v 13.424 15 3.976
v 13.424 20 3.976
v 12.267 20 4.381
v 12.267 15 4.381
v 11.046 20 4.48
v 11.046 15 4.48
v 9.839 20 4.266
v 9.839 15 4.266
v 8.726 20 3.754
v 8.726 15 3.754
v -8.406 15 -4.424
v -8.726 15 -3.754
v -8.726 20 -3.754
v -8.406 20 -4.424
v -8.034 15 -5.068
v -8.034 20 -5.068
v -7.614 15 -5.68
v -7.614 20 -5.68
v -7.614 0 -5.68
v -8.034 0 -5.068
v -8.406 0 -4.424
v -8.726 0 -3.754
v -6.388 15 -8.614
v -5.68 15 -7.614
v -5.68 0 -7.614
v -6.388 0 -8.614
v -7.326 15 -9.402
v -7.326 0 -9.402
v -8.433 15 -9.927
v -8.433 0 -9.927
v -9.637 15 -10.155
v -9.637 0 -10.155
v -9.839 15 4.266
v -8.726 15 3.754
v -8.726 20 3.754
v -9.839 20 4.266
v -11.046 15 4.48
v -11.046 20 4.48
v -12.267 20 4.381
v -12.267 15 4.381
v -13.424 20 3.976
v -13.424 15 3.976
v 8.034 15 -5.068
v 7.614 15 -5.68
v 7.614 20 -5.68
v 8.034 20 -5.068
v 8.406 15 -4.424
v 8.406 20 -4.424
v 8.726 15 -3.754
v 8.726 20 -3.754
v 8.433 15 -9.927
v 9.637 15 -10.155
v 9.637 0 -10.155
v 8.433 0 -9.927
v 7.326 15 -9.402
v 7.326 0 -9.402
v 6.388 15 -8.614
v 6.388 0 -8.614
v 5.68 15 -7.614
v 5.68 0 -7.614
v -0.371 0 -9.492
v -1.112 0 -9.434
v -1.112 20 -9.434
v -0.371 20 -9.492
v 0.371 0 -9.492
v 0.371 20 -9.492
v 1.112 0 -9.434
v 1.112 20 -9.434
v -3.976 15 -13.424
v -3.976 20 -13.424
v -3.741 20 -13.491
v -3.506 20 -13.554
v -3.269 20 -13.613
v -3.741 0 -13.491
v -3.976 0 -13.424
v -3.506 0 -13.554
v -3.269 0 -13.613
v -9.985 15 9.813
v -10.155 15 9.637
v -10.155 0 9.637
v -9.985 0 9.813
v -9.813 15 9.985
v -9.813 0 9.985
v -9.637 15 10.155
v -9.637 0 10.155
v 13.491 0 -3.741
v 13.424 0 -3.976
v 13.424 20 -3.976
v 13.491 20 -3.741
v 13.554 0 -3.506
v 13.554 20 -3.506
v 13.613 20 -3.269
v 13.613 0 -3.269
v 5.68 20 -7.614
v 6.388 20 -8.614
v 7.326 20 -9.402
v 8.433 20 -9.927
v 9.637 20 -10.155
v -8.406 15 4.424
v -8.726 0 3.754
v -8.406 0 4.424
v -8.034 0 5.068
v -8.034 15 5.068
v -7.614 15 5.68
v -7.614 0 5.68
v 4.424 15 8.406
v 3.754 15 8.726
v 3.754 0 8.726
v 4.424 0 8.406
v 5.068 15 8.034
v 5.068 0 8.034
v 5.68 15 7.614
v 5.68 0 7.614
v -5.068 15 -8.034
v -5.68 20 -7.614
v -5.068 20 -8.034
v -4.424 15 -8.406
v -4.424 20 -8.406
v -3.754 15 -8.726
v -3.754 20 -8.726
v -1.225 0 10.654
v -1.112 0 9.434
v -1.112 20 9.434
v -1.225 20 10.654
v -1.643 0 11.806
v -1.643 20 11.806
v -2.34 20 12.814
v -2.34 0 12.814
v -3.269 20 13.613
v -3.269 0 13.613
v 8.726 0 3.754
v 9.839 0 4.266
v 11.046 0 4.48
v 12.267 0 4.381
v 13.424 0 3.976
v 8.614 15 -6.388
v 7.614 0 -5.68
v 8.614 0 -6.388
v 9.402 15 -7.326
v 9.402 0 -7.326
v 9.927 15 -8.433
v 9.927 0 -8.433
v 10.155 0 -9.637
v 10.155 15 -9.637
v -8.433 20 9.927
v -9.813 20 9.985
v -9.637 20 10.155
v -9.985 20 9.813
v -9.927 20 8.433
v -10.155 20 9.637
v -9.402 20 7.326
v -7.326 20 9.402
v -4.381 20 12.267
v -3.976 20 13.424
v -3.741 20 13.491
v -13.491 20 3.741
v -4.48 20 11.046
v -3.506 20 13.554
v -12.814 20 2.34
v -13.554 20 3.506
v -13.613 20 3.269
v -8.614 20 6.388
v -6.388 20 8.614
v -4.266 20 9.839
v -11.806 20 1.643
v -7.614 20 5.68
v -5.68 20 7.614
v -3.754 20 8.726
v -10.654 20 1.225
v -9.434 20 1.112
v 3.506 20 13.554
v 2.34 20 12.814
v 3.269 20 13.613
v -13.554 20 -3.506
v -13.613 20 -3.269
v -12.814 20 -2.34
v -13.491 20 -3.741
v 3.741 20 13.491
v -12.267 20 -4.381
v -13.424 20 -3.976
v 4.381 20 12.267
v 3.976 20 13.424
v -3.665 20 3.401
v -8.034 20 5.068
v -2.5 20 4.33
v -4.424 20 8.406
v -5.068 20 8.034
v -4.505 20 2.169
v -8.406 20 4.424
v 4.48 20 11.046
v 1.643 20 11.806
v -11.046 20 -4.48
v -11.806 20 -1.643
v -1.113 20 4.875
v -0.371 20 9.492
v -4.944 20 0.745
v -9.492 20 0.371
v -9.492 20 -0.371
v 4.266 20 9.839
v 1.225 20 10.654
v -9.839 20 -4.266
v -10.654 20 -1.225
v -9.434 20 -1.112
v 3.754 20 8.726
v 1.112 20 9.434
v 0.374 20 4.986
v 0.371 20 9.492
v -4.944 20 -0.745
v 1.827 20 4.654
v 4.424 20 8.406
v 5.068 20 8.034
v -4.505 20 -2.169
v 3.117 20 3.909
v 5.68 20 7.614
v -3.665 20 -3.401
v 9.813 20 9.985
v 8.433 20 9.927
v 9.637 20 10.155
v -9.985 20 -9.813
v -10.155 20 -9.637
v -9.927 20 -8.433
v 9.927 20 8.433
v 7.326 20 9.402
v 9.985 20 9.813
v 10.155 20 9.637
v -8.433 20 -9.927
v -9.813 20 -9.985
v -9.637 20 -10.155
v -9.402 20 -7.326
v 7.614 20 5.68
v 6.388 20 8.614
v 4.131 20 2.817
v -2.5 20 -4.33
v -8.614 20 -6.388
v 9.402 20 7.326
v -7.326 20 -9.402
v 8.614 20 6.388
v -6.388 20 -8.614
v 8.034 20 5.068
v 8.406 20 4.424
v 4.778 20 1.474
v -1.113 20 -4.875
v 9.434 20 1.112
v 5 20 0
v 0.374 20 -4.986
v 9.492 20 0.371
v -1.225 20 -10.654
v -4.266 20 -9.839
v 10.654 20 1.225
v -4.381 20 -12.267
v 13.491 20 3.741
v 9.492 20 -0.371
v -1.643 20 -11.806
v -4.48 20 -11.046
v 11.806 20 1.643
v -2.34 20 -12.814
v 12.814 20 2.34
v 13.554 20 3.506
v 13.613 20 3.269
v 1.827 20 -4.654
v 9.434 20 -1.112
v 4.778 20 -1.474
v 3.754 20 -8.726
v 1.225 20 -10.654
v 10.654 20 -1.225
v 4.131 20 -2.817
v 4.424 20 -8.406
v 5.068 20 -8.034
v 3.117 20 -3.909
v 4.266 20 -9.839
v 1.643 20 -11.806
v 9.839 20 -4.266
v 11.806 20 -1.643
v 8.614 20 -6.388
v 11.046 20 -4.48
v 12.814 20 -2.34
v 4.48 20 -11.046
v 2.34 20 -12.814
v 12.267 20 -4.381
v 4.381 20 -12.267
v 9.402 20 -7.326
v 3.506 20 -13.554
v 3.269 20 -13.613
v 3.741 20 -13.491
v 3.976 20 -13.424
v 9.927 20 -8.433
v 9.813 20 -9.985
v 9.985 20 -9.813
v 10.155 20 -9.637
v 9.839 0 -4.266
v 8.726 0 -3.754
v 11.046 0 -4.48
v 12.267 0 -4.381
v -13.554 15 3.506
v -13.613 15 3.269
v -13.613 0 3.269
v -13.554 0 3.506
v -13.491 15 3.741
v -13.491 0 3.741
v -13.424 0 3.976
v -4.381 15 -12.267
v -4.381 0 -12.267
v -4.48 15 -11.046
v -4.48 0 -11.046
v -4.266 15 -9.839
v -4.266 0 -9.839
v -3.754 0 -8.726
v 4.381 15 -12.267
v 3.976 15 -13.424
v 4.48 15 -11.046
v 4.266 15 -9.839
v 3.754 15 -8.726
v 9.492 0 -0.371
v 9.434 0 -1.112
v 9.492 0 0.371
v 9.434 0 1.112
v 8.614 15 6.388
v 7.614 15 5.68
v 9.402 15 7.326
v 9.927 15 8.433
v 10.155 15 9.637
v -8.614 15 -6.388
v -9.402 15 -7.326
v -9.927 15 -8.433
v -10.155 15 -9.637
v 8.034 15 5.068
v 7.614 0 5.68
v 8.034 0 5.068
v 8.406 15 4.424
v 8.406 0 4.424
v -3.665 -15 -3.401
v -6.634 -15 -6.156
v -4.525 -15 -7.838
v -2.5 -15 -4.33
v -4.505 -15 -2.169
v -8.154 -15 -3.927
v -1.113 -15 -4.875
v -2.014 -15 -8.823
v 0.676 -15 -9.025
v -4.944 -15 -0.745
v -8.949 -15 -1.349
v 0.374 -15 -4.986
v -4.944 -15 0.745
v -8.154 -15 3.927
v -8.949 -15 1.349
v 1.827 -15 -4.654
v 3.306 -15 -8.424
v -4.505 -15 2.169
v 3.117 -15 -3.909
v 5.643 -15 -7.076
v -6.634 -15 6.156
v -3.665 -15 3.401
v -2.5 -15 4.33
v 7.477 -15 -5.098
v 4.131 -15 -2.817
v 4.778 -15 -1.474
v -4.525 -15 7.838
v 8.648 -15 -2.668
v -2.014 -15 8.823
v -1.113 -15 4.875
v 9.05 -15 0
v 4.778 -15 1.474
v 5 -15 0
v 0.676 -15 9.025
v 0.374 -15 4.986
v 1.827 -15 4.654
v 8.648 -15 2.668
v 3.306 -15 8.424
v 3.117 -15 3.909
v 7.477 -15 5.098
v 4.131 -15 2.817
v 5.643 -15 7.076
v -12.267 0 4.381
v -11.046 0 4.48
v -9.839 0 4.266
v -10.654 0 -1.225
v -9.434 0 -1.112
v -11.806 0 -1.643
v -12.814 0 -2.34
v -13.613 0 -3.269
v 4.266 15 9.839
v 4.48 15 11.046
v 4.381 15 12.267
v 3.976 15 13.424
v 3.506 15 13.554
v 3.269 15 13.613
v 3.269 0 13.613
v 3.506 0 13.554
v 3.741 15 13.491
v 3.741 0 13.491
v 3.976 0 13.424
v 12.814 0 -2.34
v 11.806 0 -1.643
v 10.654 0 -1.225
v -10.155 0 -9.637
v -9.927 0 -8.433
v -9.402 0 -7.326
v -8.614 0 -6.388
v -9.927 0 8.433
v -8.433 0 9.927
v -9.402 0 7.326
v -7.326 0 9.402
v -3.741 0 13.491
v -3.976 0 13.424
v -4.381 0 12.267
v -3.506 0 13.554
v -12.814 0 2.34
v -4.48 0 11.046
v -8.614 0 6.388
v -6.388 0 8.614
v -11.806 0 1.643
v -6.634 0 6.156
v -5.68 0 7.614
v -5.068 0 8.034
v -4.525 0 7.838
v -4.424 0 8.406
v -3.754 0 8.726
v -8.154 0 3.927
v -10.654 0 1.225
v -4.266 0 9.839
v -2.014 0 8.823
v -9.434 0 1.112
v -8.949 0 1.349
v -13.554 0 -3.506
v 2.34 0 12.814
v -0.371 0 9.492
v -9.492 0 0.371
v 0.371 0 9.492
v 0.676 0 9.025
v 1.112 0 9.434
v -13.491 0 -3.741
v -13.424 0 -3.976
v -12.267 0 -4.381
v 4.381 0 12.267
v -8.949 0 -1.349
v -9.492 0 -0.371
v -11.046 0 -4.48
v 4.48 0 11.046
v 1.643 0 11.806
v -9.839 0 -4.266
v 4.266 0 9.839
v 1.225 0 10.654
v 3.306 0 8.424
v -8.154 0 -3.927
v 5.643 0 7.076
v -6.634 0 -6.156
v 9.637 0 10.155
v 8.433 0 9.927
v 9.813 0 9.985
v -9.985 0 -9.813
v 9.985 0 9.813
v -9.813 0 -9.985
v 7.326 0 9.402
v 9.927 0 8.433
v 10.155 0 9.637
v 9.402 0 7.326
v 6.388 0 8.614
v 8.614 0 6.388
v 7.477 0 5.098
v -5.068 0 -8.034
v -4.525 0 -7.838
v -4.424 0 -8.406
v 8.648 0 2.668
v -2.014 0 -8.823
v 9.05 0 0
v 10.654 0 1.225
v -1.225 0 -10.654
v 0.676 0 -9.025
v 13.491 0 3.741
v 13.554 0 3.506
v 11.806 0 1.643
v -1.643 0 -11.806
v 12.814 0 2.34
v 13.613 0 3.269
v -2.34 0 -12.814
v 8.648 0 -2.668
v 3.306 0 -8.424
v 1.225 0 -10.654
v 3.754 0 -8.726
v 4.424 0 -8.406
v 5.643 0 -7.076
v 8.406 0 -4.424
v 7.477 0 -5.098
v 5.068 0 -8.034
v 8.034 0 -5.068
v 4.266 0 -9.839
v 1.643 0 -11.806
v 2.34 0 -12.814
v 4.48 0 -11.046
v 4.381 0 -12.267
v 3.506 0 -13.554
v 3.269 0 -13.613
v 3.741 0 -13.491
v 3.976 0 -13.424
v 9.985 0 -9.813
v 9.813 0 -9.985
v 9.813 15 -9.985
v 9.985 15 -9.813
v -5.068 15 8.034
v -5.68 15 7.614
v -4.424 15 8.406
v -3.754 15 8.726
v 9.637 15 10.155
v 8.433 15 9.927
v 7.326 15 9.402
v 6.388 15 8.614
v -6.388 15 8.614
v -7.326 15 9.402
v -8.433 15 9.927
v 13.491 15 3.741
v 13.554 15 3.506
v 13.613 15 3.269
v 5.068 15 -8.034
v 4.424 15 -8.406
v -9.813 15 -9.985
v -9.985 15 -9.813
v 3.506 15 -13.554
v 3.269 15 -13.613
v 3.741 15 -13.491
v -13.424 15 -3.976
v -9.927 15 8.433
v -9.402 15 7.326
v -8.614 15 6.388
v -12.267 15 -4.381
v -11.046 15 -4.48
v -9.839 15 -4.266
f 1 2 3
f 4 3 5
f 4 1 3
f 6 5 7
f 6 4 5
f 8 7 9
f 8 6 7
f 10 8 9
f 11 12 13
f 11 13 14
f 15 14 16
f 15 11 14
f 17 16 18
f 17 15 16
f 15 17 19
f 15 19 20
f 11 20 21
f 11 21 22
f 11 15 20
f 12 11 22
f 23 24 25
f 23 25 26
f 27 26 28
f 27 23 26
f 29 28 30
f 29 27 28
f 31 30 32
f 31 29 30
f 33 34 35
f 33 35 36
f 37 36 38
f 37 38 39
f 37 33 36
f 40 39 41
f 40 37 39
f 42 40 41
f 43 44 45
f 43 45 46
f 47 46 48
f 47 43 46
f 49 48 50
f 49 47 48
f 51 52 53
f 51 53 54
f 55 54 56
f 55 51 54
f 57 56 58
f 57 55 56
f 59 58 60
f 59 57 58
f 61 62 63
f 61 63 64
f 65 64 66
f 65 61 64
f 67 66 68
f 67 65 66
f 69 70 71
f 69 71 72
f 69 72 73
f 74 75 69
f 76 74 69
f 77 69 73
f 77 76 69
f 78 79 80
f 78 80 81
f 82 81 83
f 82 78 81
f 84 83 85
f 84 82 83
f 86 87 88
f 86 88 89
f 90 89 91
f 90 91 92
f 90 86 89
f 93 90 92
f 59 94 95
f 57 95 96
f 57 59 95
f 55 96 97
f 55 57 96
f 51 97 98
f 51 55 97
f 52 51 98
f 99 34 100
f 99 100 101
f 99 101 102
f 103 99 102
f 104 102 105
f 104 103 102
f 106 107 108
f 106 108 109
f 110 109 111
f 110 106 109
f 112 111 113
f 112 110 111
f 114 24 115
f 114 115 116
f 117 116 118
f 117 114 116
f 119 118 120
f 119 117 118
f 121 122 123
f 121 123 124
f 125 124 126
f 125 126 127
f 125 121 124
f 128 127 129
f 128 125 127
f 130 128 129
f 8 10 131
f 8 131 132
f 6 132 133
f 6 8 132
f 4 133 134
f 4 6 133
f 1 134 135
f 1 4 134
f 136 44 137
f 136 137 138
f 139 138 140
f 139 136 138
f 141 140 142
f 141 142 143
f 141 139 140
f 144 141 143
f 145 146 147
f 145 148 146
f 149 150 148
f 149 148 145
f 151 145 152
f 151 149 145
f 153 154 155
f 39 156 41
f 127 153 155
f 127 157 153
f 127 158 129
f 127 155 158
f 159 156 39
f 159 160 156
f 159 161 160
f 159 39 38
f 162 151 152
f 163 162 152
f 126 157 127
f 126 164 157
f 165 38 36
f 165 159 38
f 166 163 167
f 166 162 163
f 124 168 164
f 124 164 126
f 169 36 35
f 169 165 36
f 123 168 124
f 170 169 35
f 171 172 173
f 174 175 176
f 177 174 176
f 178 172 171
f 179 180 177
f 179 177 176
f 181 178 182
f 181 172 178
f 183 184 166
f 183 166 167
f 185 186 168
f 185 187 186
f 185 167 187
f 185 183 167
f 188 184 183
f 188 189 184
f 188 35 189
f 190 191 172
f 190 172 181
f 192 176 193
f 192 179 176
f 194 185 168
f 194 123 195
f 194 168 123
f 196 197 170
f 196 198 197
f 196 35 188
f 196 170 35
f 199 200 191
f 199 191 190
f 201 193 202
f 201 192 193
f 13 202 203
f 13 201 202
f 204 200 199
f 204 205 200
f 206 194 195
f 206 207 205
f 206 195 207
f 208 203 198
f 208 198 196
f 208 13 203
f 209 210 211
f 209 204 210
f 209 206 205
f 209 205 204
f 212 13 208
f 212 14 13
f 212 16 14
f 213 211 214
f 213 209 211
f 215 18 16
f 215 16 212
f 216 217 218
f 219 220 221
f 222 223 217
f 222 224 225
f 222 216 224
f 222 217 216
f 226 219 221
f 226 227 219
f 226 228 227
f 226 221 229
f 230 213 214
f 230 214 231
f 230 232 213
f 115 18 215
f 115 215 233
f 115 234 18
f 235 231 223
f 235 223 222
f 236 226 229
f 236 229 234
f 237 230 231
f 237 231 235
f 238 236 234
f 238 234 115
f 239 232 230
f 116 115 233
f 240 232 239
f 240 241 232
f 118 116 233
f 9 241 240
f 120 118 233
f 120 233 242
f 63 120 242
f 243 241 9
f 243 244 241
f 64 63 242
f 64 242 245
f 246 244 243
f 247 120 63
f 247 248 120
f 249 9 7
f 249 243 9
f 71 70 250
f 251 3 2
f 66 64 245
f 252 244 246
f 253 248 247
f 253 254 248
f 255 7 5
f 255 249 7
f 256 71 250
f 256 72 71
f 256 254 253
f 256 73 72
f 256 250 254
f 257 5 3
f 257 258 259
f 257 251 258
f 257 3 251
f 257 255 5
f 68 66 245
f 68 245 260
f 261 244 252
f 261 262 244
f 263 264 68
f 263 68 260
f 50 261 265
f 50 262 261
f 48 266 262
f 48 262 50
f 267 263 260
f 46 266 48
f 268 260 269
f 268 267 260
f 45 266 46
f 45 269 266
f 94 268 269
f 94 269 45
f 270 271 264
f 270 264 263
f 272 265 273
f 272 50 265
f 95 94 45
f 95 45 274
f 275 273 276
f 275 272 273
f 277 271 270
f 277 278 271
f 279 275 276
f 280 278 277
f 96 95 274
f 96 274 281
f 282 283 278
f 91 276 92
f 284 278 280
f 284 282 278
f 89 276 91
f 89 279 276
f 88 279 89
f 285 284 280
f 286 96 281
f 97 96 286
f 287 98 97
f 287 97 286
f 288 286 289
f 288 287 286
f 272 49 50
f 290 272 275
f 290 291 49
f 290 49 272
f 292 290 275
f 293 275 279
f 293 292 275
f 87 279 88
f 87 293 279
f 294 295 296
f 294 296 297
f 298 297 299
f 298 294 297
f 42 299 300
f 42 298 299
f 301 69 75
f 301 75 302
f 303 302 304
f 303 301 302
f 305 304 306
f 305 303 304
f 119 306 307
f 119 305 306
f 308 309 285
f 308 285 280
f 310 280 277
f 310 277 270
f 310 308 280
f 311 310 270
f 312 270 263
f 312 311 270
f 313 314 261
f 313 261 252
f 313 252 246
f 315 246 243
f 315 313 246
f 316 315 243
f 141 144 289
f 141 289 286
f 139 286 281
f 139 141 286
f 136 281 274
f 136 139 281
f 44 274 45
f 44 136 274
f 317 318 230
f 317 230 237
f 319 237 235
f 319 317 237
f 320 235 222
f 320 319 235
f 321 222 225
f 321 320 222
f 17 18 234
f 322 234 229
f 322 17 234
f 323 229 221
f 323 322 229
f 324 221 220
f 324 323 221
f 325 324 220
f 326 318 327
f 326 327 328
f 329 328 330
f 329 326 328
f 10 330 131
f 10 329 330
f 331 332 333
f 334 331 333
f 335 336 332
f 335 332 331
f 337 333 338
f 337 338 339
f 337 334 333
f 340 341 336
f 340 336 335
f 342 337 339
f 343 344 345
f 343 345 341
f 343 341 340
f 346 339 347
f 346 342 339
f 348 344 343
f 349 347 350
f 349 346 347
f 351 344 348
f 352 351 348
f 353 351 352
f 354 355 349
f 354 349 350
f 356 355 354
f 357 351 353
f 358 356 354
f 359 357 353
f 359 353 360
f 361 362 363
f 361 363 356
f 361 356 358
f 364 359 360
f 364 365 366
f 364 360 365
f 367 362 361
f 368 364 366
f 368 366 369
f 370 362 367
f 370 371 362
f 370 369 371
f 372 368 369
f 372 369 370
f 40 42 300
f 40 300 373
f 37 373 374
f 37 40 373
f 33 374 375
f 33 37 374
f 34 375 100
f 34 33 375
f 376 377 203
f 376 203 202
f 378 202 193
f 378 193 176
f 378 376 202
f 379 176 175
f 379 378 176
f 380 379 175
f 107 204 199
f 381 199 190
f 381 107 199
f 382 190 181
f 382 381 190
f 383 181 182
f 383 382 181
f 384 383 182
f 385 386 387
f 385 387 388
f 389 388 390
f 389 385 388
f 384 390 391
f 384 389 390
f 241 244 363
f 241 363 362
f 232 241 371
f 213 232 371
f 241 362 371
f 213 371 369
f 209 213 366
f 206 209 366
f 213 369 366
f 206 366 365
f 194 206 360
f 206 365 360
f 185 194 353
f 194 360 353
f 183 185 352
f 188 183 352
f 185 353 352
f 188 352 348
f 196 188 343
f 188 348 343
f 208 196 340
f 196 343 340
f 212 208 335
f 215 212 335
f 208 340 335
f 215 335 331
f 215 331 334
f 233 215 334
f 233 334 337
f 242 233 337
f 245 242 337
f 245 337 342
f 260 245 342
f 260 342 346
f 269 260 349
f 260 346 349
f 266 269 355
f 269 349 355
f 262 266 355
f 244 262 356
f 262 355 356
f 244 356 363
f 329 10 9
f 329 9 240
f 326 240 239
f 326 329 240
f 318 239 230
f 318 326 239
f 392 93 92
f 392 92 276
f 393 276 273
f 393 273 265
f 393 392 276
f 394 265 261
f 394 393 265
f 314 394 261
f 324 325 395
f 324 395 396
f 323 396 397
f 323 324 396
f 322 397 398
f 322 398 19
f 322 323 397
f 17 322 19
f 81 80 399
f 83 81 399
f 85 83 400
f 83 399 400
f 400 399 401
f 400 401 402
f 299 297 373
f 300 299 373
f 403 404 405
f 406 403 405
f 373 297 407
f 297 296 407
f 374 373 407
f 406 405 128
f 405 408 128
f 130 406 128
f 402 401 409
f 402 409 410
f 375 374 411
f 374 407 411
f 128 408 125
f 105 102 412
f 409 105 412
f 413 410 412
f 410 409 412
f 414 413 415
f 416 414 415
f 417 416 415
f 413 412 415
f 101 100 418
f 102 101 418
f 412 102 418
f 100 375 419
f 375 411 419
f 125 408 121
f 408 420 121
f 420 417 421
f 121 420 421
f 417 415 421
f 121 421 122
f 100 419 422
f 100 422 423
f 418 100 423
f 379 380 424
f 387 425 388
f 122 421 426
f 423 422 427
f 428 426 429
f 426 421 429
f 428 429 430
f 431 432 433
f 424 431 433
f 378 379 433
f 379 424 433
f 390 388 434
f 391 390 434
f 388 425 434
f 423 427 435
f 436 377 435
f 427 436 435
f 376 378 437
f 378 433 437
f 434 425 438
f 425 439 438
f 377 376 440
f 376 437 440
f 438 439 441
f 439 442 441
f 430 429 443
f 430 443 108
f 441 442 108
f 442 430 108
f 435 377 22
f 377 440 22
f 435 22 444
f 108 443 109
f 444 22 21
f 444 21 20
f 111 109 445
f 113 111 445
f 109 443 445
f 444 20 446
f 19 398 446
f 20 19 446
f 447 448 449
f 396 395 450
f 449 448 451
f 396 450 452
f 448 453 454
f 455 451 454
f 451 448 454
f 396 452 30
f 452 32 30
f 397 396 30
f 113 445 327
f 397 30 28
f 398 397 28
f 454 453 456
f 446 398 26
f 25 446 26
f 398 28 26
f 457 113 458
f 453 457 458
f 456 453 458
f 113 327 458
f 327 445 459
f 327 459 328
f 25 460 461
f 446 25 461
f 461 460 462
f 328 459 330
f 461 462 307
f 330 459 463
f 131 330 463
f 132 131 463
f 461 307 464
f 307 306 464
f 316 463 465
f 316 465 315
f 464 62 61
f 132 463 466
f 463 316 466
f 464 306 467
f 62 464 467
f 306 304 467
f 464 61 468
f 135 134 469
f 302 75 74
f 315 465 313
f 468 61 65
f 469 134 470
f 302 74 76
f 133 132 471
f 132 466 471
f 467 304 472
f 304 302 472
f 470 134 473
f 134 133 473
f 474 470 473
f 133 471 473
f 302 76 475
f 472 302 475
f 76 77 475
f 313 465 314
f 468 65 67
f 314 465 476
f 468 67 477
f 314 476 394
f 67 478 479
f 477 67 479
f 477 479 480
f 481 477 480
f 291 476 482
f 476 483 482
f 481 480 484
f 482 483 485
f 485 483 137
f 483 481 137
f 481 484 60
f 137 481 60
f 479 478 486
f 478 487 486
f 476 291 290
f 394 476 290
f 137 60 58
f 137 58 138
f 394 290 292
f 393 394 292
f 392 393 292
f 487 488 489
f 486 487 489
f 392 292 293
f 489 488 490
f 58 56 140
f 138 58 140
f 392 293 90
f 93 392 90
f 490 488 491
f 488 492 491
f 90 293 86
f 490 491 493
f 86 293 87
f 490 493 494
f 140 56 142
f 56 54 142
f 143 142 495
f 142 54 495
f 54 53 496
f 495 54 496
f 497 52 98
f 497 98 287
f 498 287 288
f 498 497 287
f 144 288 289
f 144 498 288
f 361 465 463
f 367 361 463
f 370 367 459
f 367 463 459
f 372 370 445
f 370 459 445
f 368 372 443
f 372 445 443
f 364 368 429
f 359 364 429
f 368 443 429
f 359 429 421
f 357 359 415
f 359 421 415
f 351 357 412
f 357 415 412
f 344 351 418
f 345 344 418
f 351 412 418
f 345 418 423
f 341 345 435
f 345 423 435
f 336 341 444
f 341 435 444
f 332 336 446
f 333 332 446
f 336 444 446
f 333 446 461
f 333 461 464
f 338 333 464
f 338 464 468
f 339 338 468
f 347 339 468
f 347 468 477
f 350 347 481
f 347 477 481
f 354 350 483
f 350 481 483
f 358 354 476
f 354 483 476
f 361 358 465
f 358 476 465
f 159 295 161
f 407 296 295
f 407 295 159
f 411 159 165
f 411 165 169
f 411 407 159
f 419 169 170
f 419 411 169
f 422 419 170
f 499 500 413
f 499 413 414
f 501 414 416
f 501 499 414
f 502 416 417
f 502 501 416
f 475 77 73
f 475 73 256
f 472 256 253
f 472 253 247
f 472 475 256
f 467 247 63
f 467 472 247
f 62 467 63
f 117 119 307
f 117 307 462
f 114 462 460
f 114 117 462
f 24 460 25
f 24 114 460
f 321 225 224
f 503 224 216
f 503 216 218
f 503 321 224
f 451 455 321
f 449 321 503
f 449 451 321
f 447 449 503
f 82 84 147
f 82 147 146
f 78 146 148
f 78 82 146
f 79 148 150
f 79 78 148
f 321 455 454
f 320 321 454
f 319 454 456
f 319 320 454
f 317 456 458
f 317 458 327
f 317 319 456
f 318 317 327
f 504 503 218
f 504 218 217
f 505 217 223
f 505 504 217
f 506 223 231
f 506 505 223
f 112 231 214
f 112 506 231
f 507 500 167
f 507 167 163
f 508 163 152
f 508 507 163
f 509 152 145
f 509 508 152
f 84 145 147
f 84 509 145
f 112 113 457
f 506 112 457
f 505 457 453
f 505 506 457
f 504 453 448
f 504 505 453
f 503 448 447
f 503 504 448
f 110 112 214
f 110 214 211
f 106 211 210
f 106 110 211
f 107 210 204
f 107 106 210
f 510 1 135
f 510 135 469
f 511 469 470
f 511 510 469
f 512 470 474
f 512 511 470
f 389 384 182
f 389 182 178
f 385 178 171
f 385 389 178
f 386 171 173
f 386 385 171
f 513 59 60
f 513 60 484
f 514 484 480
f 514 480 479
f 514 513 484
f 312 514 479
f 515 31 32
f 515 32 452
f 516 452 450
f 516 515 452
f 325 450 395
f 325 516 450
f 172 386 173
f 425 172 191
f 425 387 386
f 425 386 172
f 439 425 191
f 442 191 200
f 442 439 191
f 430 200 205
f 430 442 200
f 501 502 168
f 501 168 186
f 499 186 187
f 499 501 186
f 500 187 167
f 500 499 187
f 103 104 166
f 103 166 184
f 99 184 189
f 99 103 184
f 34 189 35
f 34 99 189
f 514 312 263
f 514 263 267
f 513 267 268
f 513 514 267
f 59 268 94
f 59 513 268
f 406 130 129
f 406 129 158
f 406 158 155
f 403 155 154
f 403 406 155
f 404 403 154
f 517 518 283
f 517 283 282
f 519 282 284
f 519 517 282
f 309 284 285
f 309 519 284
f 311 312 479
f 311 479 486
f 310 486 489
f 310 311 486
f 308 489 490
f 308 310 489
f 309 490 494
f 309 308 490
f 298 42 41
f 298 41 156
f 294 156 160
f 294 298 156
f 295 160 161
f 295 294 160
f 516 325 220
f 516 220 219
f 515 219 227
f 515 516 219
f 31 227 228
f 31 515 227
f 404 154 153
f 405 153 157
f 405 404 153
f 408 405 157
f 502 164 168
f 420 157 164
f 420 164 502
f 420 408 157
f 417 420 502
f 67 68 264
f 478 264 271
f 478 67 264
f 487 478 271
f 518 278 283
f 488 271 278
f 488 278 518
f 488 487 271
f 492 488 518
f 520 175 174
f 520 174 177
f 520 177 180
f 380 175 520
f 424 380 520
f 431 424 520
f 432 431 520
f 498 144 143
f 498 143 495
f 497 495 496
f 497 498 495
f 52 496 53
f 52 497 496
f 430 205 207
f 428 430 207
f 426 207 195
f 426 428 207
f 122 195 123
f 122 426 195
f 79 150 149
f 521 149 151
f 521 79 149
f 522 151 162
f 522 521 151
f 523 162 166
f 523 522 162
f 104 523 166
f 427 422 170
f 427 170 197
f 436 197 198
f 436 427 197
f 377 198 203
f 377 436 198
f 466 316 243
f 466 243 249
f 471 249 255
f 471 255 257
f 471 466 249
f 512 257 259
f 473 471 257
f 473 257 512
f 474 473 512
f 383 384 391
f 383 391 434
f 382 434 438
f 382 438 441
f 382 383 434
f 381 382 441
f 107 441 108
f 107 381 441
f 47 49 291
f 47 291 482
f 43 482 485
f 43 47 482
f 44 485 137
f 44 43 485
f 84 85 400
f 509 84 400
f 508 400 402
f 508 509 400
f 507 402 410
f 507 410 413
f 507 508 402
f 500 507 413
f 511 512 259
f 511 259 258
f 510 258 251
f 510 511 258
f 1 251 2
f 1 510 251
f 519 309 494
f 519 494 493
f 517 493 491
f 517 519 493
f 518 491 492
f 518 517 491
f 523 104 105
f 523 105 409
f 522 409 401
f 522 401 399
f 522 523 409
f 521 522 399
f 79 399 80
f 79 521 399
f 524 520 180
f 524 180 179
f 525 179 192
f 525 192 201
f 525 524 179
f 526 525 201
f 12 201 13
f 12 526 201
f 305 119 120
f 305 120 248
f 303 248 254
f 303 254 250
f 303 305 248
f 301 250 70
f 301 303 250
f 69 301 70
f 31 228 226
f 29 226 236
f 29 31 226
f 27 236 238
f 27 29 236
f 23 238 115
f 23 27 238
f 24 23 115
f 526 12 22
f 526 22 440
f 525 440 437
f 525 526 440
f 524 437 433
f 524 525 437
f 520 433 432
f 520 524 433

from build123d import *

# Parameters (mm, degrees)
SKETCH1_R           = 17
BOSS_EXTRUDE1_DEPTH = 20
SKETCH2_R           = 17
CUT_EXTRUDE1_DEPTH  = 15
SKETCH4_R           = 17
CUT_EXTRUDE2_DEPTH  = 5
SKETCH5_R           = 9.05
BOSS_EXTRUDE2_DEPTH = 15
SKETCH6_R           = 5
CUT_EXTRUDE3_DEPTH  = 35


with BuildPart() as part:
    # Sketch1 → Boss-Extrude1 (new body)
    with BuildSketch(Plane(origin=(0, 0, 0), x_dir=(1, 0, 0), z_dir=(0, 1, 0))):
        Circle(SKETCH1_R)
    extrude(amount=BOSS_EXTRUDE1_DEPTH)

    # Sketch2 → Cut-Extrude1 (cut)
    with BuildSketch(Plane(origin=(-13.818246137, 15, -17.496579046), x_dir=(1, 0, 0), z_dir=(0, 1, 0))):
        with Locations((13.818246137, -17.496579046)):
            Circle(SKETCH2_R)
        with BuildLine():
            ThreePointArc((19.498036508, -25.110446812), (21.14436633, -26.898819817), (23.455733413, -27.651323701))
            ThreePointArc((23.455733413, -27.651323701), (23.717741074, -27.396073983), (23.972990792, -27.134066322))
            ThreePointArc((23.972990792, -27.134066322), (23.220486908, -24.822699239), (21.432113903, -23.176369417))
            ThreePointArc((21.432113903, -23.176369417), (22.044621448, -22.246079046), (22.544022769, -21.250486767))
            ThreePointArc((22.544022769, -21.250486767), (24.86397272, -21.97609831), (27.241927274, -21.472102249))
            ThreePointArc((27.241927274, -21.472102249), (27.341207705, -21.120045678), (27.431256615, -20.765515528))
            ThreePointArc((27.431256615, -20.765515528), (25.623885593, -19.140064859), (23.251944228, -18.608487912))
            ThreePointArc((23.251944228, -18.608487912), (23.317246137, -17.496579046), (23.251944228, -16.38467018))
            ThreePointArc((23.251944228, -16.38467018), (25.623885593, -15.853093234), (27.431256615, -14.227642564))
            ThreePointArc((27.431256615, -14.227642564), (27.341207705, -13.873112415), (27.241927274, -13.521055844))
            ThreePointArc((27.241927274, -13.521055844), (24.86397272, -13.017059783), (22.544022769, -13.742671325))
            ThreePointArc((22.544022769, -13.742671325), (22.044621448, -12.747079046), (21.432113903, -11.816788676))
            ThreePointArc((21.432113903, -11.816788676), (23.220486908, -10.170458854), (23.972990792, -7.85909177))
            ThreePointArc((23.972990792, -7.85909177), (23.717741074, -7.59708411), (23.455733413, -7.341834391))
            ThreePointArc((23.455733413, -7.341834391), (21.14436633, -8.094338276), (19.498036508, -9.882711281))
            ThreePointArc((19.498036508, -9.882711281), (18.567746137, -9.270203736), (17.572153858, -8.770802415))
            ThreePointArc((17.572153858, -8.770802415), (18.297765401, -6.450852463), (17.79376934, -4.072897909))
            ThreePointArc((17.79376934, -4.072897909), (17.441712769, -3.973617478), (17.087182619, -3.883568568))
            ThreePointArc((17.087182619, -3.883568568), (15.46173195, -5.69093959), (14.930155003, -8.062880955))
            ThreePointArc((14.930155003, -8.062880955), (13.818246137, -7.997579046), (12.706337271, -8.062880955))
            ThreePointArc((12.706337271, -8.062880955), (12.174760325, -5.69093959), (10.549309655, -3.883568568))
            ThreePointArc((10.549309655, -3.883568568), (10.194779506, -3.973617478), (9.842722935, -4.072897909))
            ThreePointArc((9.842722935, -4.072897909), (9.338726874, -6.450852463), (10.064338416, -8.770802415))
            ThreePointArc((10.064338416, -8.770802415), (9.068746137, -9.270203736), (8.138455767, -9.882711281))
            ThreePointArc((8.138455767, -9.882711281), (6.492125945, -8.094338276), (4.180758862, -7.341834391))
            ThreePointArc((4.180758862, -7.341834391), (3.918751201, -7.59708411), (3.663501482, -7.85909177))
            ThreePointArc((3.663501482, -7.85909177), (4.416005367, -10.170458854), (6.204378372, -11.816788676))
            ThreePointArc((6.204378372, -11.816788676), (5.591870827, -12.747079046), (5.092469506, -13.742671325))
            ThreePointArc((5.092469506, -13.742671325), (2.772519554, -13.017059783), (0.394565, -13.521055844))
            ThreePointArc((0.394565, -13.521055844), (0.295284569, -13.873112415), (0.205235659, -14.227642564))
            ThreePointArc((0.205235659, -14.227642564), (2.012606681, -15.853093234), (4.384548046, -16.38467018))
            ThreePointArc((4.384548046, -16.38467018), (4.319246137, -17.496579046), (4.384548046, -18.608487912))
            ThreePointArc((4.384548046, -18.608487912), (2.012606681, -19.140064859), (0.205235659, -20.765515528))
            ThreePointArc((0.205235659, -20.765515528), (0.295284569, -21.120045678), (0.394565, -21.472102249))
            ThreePointArc((0.394565, -21.472102249), (2.772519554, -21.97609831), (5.092469506, -21.250486767))
            ThreePointArc((5.092469506, -21.250486767), (5.591870827, -22.246079046), (6.204378372, -23.176369417))
            ThreePointArc((6.204378372, -23.176369417), (4.416005367, -24.822699239), (3.663501482, -27.134066322))
            ThreePointArc((3.663501482, -27.134066322), (3.918751201, -27.396073983), (4.180758862, -27.651323701))
            ThreePointArc((4.180758862, -27.651323701), (6.492125945, -26.898819817), (8.138455767, -25.110446812))
            ThreePointArc((8.138455767, -25.110446812), (9.068746137, -25.722954357), (10.064338416, -26.222355678))
            ThreePointArc((10.064338416, -26.222355678), (9.338726874, -28.542305629), (9.842722935, -30.920260183))
            ThreePointArc((9.842722935, -30.920260183), (10.194779506, -31.019540614), (10.549309655, -31.109589524))
            ThreePointArc((10.549309655, -31.109589524), (12.174760325, -29.302218502), (12.706337271, -26.930277137))
            ThreePointArc((12.706337271, -26.930277137), (13.818246137, -26.995579046), (14.930155003, -26.930277137))
            ThreePointArc((14.930155003, -26.930277137), (15.46173195, -29.302218502), (17.087182619, -31.109589524))
            ThreePointArc((17.087182619, -31.109589524), (17.441712769, -31.019540614), (17.79376934, -30.920260183))
            ThreePointArc((17.79376934, -30.920260183), (18.297765401, -28.542305629), (17.572153858, -26.222355678))
            ThreePointArc((17.572153858, -26.222355678), (18.567746137, -25.722954357), (19.498036508, -25.110446812))
        make_face(mode=Mode.SUBTRACT)
    extrude(amount=-CUT_EXTRUDE1_DEPTH, mode=Mode.SUBTRACT)

    # Sketch4 → Cut-Extrude2 (cut)
    with BuildSketch(Plane.XZ.offset(-15)):
        Circle(SKETCH4_R)
        with BuildLine():
            ThreePointArc((5.67979037, 7.613867765), (4.7495, 8.226375311), (3.753907721, 8.725776632))
            ThreePointArc((3.753907721, 8.725776632), (4.479519264, 11.045726583), (3.975523202, 13.423681137))
            ThreePointArc((3.975523202, 13.423681137), (3.623466631, 13.522961568), (3.268936482, 13.613010478))
            ThreePointArc((3.268936482, 13.613010478), (1.643485813, 11.805639456), (1.111908866, 9.433698091))
            ThreePointArc((1.111908866, 9.433698091), (0, 9.499), (-1.111908866, 9.433698091))
            ThreePointArc((-1.111908866, 9.433698091), (-1.643485813, 11.805639456), (-3.268936482, 13.613010478))
            ThreePointArc((-3.268936482, 13.613010478), (-3.623466631, 13.522961568), (-3.975523202, 13.423681137))
            ThreePointArc((-3.975523202, 13.423681137), (-4.479519264, 11.045726583), (-3.753907721, 8.725776632))
            ThreePointArc((-3.753907721, 8.725776632), (-4.7495, 8.226375311), (-5.67979037, 7.613867765))
            ThreePointArc((-5.67979037, 7.613867765), (-7.326120193, 9.402240771), (-9.637487276, 10.154744655))
            ThreePointArc((-9.637487276, 10.154744655), (-9.899494937, 9.899494937), (-10.154744655, 9.637487276))
            ThreePointArc((-10.154744655, 9.637487276), (-9.402240771, 7.326120193), (-7.613867765, 5.67979037))
            ThreePointArc((-7.613867765, 5.67979037), (-8.226375311, 4.7495), (-8.725776632, 3.753907721))
            ThreePointArc((-8.725776632, 3.753907721), (-11.045726583, 4.479519264), (-13.423681137, 3.975523202))
            ThreePointArc((-13.423681137, 3.975523202), (-13.522961568, 3.623466631), (-13.613010478, 3.268936482))
            ThreePointArc((-13.613010478, 3.268936482), (-11.805639456, 1.643485813), (-9.433698091, 1.111908866))
            ThreePointArc((-9.433698091, 1.111908866), (-9.499, 0), (-9.433698091, -1.111908866))
            ThreePointArc((-9.433698091, -1.111908866), (-11.805639456, -1.643485813), (-13.613010478, -3.268936482))
            ThreePointArc((-13.613010478, -3.268936482), (-13.522961568, -3.623466631), (-13.423681137, -3.975523202))
            ThreePointArc((-13.423681137, -3.975523202), (-11.045726583, -4.479519264), (-8.725776632, -3.753907721))
            ThreePointArc((-8.725776632, -3.753907721), (-8.226375311, -4.7495), (-7.613867765, -5.67979037))
            ThreePointArc((-7.613867765, -5.67979037), (-9.402240771, -7.326120193), (-10.154744655, -9.637487276))
            ThreePointArc((-10.154744655, -9.637487276), (-9.899494937, -9.899494937), (-9.637487276, -10.154744655))
            ThreePointArc((-9.637487276, -10.154744655), (-7.326120193, -9.402240771), (-5.67979037, -7.613867765))
            ThreePointArc((-5.67979037, -7.613867765), (-4.7495, -8.226375311), (-3.753907721, -8.725776632))
            ThreePointArc((-3.753907721, -8.725776632), (-4.479519264, -11.045726583), (-3.975523202, -13.423681137))
            ThreePointArc((-3.975523202, -13.423681137), (-3.623466631, -13.522961568), (-3.268936482, -13.613010478))
            ThreePointArc((-3.268936482, -13.613010478), (-1.643485813, -11.805639456), (-1.111908866, -9.433698091))
            ThreePointArc((-1.111908866, -9.433698091), (0, -9.499), (1.111908866, -9.433698091))
            ThreePointArc((1.111908866, -9.433698091), (1.643485813, -11.805639456), (3.268936482, -13.613010478))
            ThreePointArc((3.268936482, -13.613010478), (3.623466631, -13.522961568), (3.975523202, -13.423681137))
            ThreePointArc((3.975523202, -13.423681137), (4.479519264, -11.045726583), (3.753907721, -8.725776632))
            ThreePointArc((3.753907721, -8.725776632), (4.7495, -8.226375311), (5.67979037, -7.613867765))
            ThreePointArc((5.67979037, -7.613867765), (7.326120193, -9.402240771), (9.637487276, -10.154744655))
            ThreePointArc((9.637487276, -10.154744655), (9.899494937, -9.899494937), (10.154744655, -9.637487276))
            ThreePointArc((10.154744655, -9.637487276), (9.402240771, -7.326120193), (7.613867765, -5.67979037))
            ThreePointArc((7.613867765, -5.67979037), (8.226375311, -4.7495), (8.725776632, -3.753907721))
            ThreePointArc((8.725776632, -3.753907721), (11.045726583, -4.479519264), (13.423681137, -3.975523202))
            ThreePointArc((13.423681137, -3.975523202), (13.522961568, -3.623466631), (13.613010478, -3.268936482))
            ThreePointArc((13.613010478, -3.268936482), (11.805639456, -1.643485813), (9.433698091, -1.111908866))
            ThreePointArc((9.433698091, -1.111908866), (9.499, 0), (9.433698091, 1.111908866))
            ThreePointArc((9.433698091, 1.111908866), (11.805639456, 1.643485813), (13.613010478, 3.268936482))
            ThreePointArc((13.613010478, 3.268936482), (13.522961568, 3.623466631), (13.423681137, 3.975523202))
            ThreePointArc((13.423681137, 3.975523202), (11.045726583, 4.479519264), (8.725776632, 3.753907721))
            ThreePointArc((8.725776632, 3.753907721), (8.226375311, 4.7495), (7.613867765, 5.67979037))
            ThreePointArc((7.613867765, 5.67979037), (9.402240771, 7.326120193), (10.154744655, 9.637487276))
            ThreePointArc((10.154744655, 9.637487276), (9.899494937, 9.899494937), (9.637487276, 10.154744655))
            ThreePointArc((9.637487276, 10.154744655), (7.326120193, 9.402240771), (5.67979037, 7.613867765))
        make_face(mode=Mode.SUBTRACT)
    extrude(amount=-CUT_EXTRUDE2_DEPTH, mode=Mode.SUBTRACT)

    # Sketch5 → Boss-Extrude2 (add)
    with BuildSketch(Plane.XZ):
        Circle(SKETCH5_R)
    extrude(amount=BOSS_EXTRUDE2_DEPTH)

    # Sketch6 → Cut-Extrude3 (cut)
    with BuildSketch(Plane.XZ.offset(15)):
        Circle(SKETCH6_R)
    extrude(amount=-CUT_EXTRUDE3_DEPTH, mode=Mode.SUBTRACT)


solid = part.part
